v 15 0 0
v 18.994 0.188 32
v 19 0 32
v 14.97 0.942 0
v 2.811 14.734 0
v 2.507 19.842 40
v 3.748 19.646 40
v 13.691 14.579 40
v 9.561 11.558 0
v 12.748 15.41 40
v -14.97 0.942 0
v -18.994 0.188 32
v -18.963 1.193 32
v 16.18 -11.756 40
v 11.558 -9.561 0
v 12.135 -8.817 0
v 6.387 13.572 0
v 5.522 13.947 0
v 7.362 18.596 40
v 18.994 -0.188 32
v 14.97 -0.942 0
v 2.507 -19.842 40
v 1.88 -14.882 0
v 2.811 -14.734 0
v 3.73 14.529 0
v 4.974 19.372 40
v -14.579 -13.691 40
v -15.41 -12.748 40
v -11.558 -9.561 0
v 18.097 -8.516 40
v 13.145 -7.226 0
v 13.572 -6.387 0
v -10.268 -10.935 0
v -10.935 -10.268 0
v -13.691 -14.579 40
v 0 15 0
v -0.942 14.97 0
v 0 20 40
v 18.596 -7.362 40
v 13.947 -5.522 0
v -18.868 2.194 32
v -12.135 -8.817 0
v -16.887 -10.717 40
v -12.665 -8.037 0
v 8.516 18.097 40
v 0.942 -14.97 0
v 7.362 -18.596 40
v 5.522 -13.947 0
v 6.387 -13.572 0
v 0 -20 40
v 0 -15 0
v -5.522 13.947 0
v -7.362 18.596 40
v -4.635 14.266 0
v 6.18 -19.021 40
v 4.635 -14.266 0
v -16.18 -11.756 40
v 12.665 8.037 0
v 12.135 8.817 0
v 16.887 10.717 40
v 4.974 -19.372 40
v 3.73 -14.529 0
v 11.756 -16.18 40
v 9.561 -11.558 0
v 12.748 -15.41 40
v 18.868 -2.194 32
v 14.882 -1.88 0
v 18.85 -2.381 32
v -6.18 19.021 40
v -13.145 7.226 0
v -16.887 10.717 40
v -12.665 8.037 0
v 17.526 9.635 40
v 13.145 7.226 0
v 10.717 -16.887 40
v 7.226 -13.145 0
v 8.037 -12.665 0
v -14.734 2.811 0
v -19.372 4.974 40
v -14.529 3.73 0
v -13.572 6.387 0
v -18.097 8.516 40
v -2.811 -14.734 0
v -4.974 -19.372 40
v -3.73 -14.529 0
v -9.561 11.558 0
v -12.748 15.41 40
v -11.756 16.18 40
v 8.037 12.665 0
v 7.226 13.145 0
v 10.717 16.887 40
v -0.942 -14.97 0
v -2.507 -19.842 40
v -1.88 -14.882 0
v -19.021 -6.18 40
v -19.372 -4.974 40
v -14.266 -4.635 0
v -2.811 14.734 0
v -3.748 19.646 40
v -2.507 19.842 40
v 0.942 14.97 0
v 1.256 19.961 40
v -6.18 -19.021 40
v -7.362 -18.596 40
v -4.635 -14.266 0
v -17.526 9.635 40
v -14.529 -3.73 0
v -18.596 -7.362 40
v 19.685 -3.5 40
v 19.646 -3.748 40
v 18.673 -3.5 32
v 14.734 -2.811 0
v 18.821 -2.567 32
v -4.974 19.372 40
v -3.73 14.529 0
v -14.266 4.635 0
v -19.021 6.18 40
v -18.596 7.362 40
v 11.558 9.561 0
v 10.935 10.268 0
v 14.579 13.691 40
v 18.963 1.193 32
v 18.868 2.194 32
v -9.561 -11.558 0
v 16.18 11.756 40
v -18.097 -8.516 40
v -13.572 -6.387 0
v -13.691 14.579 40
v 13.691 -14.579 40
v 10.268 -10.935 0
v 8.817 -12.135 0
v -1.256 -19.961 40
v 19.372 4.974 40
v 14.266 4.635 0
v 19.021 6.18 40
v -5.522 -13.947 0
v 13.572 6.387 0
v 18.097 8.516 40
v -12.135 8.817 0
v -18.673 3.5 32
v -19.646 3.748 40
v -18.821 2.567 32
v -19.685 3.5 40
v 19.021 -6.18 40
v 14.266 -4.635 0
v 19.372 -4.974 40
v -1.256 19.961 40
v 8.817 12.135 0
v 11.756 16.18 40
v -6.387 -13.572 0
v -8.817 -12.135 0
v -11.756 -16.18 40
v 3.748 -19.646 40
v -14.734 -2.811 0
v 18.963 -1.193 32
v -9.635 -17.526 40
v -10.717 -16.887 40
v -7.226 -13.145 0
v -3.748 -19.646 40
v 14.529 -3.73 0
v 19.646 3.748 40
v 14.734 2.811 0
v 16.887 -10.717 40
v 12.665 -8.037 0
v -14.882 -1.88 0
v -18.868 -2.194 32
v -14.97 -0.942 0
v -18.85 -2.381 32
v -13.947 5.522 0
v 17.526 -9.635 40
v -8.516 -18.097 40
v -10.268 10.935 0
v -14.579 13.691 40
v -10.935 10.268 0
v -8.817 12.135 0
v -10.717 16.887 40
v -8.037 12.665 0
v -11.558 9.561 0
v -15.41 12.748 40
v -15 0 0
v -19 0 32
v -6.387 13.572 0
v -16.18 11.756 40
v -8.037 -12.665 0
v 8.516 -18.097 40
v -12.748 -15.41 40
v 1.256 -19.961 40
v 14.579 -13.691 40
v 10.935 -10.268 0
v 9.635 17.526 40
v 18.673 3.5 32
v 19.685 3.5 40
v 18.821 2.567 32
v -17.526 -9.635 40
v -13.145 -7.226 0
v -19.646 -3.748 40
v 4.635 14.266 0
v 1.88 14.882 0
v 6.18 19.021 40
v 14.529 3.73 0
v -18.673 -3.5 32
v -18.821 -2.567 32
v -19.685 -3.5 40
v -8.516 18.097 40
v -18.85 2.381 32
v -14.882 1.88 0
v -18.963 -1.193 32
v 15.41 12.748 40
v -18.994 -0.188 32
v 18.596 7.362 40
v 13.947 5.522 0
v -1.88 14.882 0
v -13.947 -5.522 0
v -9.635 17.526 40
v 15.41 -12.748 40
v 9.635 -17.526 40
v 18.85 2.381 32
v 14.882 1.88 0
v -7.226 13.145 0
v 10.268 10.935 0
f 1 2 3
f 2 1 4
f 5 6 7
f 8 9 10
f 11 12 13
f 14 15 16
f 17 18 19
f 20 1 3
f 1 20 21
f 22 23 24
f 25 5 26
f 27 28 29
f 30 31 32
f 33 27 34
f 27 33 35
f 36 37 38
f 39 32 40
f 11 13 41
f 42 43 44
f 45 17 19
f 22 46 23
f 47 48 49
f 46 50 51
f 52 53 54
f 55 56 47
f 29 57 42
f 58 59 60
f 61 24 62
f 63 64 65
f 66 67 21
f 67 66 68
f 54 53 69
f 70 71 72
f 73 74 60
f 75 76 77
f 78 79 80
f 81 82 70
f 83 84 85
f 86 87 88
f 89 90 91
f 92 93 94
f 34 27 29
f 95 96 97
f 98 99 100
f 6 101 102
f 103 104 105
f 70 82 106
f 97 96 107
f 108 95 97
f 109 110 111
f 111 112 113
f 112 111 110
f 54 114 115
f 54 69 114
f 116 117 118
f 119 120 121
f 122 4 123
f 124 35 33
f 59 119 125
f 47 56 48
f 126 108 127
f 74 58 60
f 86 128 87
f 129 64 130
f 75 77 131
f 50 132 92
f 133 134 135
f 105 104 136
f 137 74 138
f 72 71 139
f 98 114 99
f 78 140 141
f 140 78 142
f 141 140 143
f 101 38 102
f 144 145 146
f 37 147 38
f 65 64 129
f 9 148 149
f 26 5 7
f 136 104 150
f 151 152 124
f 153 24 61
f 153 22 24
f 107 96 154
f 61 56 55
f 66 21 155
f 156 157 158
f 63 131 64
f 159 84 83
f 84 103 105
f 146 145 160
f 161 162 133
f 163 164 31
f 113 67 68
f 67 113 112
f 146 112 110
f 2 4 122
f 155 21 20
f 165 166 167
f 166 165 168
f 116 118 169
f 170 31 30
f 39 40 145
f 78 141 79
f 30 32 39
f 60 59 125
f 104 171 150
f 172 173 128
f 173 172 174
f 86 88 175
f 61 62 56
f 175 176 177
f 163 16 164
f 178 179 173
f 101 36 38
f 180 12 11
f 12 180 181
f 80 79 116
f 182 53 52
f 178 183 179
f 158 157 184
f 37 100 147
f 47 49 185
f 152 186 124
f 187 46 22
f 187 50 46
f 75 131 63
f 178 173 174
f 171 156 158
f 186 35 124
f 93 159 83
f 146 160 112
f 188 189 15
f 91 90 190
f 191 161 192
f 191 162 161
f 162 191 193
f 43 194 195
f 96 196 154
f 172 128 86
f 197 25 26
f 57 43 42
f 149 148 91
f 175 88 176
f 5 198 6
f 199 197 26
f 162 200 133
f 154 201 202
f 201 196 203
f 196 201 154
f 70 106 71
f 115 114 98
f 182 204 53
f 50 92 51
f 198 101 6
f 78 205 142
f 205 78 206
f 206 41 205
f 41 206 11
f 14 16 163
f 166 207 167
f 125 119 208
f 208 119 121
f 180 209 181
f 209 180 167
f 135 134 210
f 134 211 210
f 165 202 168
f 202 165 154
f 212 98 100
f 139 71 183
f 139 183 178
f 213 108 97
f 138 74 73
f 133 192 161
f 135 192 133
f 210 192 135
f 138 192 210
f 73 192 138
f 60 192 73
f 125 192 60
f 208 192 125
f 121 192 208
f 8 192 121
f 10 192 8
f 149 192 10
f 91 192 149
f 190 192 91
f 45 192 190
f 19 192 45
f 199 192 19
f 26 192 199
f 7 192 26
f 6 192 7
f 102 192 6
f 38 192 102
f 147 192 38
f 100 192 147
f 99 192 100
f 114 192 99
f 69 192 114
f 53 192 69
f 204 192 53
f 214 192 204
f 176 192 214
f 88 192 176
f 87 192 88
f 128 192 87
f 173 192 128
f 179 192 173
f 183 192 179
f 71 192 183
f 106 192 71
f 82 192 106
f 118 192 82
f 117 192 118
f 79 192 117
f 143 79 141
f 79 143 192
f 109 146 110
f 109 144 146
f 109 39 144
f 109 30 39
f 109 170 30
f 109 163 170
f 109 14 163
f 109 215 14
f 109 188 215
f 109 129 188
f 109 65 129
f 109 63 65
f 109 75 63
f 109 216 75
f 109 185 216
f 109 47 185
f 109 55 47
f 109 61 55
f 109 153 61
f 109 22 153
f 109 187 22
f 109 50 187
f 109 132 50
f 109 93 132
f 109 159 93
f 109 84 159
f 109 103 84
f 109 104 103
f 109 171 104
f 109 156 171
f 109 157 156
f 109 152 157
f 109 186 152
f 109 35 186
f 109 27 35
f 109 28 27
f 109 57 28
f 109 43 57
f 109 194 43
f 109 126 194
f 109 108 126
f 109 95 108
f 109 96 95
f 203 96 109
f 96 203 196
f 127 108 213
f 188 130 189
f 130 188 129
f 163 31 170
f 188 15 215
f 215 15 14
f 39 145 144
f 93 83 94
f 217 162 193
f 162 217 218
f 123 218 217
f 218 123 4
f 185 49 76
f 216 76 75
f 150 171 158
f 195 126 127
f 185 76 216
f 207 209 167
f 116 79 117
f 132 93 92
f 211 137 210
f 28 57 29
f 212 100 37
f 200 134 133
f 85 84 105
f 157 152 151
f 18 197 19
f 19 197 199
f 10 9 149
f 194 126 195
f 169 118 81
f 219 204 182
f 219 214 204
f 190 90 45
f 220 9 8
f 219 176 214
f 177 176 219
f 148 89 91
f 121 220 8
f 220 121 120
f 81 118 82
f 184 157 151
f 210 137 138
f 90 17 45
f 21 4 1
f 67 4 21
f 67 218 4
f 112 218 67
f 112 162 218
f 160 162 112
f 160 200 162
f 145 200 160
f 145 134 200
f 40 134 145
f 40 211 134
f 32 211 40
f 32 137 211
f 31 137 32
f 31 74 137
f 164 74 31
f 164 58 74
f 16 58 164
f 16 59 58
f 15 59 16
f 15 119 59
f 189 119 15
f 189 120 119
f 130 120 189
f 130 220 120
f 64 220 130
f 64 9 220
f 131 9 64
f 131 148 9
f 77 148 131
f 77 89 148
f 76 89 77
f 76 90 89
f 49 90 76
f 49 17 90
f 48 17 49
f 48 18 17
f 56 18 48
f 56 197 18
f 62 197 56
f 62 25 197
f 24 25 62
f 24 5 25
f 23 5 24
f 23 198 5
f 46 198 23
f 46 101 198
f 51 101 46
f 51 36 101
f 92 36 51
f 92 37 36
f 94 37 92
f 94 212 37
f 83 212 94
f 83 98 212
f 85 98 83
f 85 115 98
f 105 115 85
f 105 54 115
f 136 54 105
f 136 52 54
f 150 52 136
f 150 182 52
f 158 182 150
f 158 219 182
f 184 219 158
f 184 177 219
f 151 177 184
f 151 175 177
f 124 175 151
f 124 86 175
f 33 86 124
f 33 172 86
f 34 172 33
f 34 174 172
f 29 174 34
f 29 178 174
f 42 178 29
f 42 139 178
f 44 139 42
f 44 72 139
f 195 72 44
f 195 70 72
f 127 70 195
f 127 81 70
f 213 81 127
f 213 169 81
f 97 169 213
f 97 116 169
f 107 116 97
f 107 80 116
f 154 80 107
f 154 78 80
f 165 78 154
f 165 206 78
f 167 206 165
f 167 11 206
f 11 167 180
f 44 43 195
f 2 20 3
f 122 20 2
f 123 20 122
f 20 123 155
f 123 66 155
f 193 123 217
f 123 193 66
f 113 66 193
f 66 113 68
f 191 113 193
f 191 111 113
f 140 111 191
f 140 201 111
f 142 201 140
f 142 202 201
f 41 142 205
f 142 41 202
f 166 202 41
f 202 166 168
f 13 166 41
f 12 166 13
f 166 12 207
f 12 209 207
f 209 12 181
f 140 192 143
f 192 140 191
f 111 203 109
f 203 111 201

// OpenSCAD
// Christmas Tree Stand
// A tapered cork/plant-pot shaped stand with a slot to hold a tree trunk.
//
// Parameters (all in mm)

// Base diameter (bottom, smaller end)
base_diameter = 30;

// Top diameter (larger end)
top_diameter = 40;

// Overall height
height = 40;

// Slot width (gap for tree trunk)
slot_width = 7;

// Slot depth (how far down from the top)
slot_depth = 8;

// Resolution
$fn = 100;

// Main body: tapered cylinder (truncated cone)
difference() {
    cylinder(h = height, d1 = base_diameter, d2 = top_diameter);
    
    // Slot cut from the top
    translate([-(top_diameter / 2 + 1), -(slot_width / 2), height - slot_depth])
        cube([top_diameter + 2, slot_width, slot_depth + 1]);
}
